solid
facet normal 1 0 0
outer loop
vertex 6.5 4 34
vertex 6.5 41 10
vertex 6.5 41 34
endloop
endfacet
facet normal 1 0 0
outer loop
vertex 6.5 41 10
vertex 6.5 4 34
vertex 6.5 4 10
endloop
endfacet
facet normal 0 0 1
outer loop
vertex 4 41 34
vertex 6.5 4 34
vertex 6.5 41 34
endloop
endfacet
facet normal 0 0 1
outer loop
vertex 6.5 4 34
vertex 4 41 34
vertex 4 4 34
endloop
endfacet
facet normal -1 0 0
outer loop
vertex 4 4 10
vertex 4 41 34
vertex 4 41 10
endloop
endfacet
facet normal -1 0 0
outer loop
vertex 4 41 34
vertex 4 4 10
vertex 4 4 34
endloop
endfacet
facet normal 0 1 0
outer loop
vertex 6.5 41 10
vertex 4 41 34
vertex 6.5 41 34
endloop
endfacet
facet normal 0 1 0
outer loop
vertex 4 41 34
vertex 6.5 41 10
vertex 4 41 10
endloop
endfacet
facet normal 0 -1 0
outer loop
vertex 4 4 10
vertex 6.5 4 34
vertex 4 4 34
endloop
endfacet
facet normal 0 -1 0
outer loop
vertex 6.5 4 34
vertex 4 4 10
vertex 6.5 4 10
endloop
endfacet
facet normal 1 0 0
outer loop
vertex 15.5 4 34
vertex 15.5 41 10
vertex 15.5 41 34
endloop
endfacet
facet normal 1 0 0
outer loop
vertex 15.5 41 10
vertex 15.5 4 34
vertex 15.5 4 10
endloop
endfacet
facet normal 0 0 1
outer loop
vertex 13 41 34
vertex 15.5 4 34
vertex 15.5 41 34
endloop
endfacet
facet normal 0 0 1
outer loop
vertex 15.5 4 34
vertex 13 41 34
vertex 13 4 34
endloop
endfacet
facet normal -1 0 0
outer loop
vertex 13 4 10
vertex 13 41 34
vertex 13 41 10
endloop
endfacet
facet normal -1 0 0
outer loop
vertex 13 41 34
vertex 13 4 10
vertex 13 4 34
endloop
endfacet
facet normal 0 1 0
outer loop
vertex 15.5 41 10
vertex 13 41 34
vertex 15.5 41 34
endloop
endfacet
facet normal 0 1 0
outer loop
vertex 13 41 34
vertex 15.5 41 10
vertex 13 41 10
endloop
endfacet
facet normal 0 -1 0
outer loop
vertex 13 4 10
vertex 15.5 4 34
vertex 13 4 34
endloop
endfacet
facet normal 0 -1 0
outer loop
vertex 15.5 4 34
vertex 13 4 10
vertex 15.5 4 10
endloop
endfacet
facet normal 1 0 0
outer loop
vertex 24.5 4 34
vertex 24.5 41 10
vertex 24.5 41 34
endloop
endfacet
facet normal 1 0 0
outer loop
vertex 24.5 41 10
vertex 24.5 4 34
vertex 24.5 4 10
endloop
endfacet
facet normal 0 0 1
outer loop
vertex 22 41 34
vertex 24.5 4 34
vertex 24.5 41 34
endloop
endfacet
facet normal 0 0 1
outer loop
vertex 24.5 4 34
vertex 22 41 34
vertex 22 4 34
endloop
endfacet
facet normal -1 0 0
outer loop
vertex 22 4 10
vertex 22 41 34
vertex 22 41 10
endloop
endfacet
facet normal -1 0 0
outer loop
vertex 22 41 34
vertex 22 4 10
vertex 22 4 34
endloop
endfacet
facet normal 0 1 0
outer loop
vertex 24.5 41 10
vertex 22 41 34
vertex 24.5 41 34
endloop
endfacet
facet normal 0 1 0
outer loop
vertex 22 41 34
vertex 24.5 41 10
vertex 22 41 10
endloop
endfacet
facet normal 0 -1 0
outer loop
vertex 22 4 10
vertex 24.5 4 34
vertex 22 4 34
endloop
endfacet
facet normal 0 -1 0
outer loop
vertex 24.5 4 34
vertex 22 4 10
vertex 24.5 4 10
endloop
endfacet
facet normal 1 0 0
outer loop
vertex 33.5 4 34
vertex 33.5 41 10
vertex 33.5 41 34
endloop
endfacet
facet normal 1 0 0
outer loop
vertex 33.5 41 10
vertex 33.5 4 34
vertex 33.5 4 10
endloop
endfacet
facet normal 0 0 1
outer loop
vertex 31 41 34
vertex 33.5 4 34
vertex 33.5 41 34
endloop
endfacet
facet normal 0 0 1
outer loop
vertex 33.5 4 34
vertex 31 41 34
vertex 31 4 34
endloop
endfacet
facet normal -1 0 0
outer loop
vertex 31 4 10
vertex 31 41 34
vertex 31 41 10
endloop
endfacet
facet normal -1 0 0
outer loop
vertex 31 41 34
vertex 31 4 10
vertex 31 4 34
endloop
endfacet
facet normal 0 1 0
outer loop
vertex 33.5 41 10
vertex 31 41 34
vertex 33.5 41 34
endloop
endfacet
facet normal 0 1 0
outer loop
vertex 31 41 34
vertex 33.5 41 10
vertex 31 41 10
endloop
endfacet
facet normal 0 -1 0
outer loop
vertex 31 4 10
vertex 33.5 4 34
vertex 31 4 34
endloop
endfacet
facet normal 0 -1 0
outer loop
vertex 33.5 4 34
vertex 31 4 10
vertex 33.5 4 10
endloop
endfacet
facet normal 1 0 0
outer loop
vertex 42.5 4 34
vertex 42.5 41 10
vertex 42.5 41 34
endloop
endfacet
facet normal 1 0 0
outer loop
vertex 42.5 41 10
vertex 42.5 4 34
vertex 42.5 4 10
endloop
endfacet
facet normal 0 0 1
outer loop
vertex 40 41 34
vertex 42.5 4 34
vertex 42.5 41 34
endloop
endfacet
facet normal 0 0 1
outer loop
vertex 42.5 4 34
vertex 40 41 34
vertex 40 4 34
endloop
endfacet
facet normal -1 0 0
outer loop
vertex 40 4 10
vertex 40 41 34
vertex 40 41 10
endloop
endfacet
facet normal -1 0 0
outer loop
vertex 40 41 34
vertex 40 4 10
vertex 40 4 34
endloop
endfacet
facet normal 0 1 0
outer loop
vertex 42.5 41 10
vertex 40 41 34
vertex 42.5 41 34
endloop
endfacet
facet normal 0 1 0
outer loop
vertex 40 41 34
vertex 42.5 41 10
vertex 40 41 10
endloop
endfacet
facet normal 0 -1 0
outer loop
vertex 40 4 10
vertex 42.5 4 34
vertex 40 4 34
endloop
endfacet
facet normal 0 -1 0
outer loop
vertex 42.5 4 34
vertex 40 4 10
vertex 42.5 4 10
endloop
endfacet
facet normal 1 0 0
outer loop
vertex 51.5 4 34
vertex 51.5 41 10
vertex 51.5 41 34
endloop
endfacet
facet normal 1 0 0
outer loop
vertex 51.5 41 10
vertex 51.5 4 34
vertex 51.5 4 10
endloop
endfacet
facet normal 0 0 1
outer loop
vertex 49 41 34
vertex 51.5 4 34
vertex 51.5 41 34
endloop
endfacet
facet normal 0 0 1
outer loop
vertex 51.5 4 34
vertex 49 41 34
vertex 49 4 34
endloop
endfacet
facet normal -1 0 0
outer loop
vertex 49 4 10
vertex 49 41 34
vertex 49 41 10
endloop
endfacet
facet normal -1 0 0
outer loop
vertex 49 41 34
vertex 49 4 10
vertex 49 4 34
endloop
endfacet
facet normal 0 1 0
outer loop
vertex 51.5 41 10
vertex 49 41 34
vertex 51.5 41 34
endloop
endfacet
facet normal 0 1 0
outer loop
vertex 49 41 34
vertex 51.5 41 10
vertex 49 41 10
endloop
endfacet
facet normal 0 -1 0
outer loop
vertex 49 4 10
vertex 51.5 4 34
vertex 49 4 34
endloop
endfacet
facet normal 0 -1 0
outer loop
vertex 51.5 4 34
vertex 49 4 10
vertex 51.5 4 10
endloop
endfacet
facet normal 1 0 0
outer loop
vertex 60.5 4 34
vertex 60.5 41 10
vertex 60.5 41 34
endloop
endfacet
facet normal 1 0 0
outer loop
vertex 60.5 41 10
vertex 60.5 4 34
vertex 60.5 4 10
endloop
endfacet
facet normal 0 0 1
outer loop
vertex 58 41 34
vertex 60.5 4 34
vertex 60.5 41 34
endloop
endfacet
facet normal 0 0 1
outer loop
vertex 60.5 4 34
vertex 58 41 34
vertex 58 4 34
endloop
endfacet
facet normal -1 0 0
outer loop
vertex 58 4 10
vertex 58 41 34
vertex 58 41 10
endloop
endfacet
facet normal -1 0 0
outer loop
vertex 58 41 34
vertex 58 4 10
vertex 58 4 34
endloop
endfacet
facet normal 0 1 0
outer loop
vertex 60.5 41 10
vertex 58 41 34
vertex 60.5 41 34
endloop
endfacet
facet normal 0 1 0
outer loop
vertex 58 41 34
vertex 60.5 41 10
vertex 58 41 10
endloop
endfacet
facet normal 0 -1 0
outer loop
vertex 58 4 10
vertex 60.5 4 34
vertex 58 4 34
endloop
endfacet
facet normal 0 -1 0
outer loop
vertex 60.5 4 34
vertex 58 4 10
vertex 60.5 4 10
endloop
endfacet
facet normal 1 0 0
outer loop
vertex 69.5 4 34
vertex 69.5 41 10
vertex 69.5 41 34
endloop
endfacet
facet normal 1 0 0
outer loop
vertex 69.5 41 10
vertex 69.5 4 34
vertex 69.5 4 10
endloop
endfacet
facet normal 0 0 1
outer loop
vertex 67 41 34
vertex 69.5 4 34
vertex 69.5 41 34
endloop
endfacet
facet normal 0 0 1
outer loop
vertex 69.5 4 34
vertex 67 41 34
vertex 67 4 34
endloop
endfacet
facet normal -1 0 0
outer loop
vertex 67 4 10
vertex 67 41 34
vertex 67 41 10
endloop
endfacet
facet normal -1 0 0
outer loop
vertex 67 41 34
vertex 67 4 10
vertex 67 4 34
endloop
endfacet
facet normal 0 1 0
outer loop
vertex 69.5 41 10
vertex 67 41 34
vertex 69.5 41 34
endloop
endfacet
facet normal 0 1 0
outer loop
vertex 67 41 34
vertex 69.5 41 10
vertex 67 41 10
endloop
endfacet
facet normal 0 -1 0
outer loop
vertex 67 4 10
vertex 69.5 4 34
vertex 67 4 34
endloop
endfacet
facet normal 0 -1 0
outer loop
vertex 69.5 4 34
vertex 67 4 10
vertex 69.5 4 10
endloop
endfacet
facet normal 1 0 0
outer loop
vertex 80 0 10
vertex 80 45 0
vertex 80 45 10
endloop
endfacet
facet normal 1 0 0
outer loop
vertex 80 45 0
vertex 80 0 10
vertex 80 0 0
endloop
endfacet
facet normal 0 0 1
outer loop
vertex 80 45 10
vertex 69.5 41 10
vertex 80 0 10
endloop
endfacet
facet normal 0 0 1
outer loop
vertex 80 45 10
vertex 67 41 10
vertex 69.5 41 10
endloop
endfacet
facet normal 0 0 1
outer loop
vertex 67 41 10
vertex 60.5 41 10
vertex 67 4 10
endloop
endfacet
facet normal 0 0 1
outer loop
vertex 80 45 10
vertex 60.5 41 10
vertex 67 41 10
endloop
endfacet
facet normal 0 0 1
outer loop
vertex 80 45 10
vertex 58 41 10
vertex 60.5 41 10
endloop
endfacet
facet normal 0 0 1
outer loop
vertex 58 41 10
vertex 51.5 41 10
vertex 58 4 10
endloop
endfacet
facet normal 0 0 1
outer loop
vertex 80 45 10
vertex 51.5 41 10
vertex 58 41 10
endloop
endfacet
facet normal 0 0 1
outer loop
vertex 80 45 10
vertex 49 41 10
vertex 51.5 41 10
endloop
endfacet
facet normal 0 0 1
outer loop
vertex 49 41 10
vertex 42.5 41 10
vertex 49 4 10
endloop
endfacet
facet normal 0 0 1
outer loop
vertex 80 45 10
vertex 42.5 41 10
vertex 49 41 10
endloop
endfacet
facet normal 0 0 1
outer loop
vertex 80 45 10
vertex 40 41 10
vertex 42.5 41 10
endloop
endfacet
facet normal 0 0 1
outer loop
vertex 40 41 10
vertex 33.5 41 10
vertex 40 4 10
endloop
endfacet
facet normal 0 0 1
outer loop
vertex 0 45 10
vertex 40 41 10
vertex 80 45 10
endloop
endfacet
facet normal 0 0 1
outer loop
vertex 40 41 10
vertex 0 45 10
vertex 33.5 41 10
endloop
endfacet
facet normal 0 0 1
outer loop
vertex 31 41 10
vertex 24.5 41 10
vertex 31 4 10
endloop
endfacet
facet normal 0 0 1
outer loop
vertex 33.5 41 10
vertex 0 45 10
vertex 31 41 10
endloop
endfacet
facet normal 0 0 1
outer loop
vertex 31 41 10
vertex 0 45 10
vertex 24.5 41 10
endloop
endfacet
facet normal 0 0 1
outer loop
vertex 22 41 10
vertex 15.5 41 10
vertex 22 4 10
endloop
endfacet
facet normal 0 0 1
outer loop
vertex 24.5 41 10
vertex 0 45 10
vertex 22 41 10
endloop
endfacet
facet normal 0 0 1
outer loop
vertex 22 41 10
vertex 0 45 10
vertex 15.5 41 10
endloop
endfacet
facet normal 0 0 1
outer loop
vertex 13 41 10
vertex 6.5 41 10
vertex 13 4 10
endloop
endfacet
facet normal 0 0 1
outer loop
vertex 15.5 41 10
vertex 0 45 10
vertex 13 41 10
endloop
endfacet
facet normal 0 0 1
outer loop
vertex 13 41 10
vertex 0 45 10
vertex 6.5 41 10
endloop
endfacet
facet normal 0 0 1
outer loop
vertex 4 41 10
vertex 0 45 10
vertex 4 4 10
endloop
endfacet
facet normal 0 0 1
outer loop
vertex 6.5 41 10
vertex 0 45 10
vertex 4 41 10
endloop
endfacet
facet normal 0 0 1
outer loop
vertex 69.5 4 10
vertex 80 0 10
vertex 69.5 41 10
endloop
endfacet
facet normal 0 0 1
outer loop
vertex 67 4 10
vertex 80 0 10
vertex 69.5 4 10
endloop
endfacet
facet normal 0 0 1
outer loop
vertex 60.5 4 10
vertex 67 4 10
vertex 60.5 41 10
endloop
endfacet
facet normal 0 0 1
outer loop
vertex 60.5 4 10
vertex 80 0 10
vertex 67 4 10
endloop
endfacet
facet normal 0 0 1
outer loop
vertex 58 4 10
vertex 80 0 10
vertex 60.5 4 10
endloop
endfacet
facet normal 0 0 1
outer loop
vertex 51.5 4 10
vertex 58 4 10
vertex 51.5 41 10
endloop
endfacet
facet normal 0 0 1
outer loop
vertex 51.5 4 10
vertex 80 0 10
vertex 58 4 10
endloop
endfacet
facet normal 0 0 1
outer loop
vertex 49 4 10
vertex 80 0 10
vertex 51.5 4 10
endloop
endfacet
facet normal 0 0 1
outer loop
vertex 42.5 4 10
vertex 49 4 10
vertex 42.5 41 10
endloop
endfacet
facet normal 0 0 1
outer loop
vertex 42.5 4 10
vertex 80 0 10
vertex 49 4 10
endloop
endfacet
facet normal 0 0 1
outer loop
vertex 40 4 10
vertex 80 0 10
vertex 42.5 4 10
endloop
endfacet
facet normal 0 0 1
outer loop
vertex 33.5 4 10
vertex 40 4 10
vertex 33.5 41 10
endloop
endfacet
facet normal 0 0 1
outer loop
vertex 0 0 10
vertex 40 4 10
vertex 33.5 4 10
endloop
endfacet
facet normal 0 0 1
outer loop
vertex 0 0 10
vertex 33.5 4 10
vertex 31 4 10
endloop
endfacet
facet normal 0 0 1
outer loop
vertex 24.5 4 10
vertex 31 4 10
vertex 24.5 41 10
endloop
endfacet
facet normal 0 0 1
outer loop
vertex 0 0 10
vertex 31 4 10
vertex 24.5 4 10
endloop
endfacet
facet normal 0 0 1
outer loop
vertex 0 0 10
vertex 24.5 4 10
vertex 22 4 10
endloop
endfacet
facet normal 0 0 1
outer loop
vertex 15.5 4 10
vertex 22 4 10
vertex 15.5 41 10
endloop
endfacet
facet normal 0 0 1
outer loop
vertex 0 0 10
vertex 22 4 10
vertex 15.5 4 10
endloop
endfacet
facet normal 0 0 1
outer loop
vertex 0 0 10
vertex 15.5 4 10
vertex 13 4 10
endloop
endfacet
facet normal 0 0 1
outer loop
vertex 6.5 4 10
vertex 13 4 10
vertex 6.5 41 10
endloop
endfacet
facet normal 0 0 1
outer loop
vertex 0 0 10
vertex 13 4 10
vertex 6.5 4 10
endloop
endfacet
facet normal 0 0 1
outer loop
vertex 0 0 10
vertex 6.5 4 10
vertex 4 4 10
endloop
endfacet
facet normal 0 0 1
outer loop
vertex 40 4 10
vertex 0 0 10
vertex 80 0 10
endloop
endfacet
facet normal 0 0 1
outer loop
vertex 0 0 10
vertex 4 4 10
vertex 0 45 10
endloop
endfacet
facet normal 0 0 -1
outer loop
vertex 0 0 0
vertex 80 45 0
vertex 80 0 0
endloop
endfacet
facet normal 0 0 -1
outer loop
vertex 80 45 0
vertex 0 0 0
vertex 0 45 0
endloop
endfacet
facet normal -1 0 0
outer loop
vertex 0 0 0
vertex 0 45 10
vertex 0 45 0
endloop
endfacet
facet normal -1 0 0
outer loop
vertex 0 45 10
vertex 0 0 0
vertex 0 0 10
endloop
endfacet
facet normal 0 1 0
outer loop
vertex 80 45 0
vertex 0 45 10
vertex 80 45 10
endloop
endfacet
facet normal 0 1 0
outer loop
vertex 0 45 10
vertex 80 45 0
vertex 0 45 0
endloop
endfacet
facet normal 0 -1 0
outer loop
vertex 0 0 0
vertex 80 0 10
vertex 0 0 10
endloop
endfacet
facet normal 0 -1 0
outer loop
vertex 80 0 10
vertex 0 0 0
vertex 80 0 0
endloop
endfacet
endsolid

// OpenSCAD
$fn = 32;

// ----------------------------------------------------------------------
// Heatsink: uniform fin block
// ----------------------------------------------------------------------

// --- parameters (mm) ---
base_l = 80;              // base length, X
base_w = 45;              // base width, Y
base_t = 10;              // base plate thickness
fin_h = 25;               // fin height above the base
fin_t = 2.5;              // fin thickness
edge = 4;                 // margin from the base ends
pitch = 9;                // fin pitch

n_fins = floor((base_l - 2 * edge - fin_t) / pitch) + 1;  // fin count
total_h = base_t + fin_h - 1;  // overall height

union() {
  cube([base_l, base_w, base_t]);
  for (i = [0 : n_fins - 1])
    translate([edge + i * pitch, edge, base_t - 1])
      cube([fin_t, base_w - 2 * edge, fin_h]);
}
